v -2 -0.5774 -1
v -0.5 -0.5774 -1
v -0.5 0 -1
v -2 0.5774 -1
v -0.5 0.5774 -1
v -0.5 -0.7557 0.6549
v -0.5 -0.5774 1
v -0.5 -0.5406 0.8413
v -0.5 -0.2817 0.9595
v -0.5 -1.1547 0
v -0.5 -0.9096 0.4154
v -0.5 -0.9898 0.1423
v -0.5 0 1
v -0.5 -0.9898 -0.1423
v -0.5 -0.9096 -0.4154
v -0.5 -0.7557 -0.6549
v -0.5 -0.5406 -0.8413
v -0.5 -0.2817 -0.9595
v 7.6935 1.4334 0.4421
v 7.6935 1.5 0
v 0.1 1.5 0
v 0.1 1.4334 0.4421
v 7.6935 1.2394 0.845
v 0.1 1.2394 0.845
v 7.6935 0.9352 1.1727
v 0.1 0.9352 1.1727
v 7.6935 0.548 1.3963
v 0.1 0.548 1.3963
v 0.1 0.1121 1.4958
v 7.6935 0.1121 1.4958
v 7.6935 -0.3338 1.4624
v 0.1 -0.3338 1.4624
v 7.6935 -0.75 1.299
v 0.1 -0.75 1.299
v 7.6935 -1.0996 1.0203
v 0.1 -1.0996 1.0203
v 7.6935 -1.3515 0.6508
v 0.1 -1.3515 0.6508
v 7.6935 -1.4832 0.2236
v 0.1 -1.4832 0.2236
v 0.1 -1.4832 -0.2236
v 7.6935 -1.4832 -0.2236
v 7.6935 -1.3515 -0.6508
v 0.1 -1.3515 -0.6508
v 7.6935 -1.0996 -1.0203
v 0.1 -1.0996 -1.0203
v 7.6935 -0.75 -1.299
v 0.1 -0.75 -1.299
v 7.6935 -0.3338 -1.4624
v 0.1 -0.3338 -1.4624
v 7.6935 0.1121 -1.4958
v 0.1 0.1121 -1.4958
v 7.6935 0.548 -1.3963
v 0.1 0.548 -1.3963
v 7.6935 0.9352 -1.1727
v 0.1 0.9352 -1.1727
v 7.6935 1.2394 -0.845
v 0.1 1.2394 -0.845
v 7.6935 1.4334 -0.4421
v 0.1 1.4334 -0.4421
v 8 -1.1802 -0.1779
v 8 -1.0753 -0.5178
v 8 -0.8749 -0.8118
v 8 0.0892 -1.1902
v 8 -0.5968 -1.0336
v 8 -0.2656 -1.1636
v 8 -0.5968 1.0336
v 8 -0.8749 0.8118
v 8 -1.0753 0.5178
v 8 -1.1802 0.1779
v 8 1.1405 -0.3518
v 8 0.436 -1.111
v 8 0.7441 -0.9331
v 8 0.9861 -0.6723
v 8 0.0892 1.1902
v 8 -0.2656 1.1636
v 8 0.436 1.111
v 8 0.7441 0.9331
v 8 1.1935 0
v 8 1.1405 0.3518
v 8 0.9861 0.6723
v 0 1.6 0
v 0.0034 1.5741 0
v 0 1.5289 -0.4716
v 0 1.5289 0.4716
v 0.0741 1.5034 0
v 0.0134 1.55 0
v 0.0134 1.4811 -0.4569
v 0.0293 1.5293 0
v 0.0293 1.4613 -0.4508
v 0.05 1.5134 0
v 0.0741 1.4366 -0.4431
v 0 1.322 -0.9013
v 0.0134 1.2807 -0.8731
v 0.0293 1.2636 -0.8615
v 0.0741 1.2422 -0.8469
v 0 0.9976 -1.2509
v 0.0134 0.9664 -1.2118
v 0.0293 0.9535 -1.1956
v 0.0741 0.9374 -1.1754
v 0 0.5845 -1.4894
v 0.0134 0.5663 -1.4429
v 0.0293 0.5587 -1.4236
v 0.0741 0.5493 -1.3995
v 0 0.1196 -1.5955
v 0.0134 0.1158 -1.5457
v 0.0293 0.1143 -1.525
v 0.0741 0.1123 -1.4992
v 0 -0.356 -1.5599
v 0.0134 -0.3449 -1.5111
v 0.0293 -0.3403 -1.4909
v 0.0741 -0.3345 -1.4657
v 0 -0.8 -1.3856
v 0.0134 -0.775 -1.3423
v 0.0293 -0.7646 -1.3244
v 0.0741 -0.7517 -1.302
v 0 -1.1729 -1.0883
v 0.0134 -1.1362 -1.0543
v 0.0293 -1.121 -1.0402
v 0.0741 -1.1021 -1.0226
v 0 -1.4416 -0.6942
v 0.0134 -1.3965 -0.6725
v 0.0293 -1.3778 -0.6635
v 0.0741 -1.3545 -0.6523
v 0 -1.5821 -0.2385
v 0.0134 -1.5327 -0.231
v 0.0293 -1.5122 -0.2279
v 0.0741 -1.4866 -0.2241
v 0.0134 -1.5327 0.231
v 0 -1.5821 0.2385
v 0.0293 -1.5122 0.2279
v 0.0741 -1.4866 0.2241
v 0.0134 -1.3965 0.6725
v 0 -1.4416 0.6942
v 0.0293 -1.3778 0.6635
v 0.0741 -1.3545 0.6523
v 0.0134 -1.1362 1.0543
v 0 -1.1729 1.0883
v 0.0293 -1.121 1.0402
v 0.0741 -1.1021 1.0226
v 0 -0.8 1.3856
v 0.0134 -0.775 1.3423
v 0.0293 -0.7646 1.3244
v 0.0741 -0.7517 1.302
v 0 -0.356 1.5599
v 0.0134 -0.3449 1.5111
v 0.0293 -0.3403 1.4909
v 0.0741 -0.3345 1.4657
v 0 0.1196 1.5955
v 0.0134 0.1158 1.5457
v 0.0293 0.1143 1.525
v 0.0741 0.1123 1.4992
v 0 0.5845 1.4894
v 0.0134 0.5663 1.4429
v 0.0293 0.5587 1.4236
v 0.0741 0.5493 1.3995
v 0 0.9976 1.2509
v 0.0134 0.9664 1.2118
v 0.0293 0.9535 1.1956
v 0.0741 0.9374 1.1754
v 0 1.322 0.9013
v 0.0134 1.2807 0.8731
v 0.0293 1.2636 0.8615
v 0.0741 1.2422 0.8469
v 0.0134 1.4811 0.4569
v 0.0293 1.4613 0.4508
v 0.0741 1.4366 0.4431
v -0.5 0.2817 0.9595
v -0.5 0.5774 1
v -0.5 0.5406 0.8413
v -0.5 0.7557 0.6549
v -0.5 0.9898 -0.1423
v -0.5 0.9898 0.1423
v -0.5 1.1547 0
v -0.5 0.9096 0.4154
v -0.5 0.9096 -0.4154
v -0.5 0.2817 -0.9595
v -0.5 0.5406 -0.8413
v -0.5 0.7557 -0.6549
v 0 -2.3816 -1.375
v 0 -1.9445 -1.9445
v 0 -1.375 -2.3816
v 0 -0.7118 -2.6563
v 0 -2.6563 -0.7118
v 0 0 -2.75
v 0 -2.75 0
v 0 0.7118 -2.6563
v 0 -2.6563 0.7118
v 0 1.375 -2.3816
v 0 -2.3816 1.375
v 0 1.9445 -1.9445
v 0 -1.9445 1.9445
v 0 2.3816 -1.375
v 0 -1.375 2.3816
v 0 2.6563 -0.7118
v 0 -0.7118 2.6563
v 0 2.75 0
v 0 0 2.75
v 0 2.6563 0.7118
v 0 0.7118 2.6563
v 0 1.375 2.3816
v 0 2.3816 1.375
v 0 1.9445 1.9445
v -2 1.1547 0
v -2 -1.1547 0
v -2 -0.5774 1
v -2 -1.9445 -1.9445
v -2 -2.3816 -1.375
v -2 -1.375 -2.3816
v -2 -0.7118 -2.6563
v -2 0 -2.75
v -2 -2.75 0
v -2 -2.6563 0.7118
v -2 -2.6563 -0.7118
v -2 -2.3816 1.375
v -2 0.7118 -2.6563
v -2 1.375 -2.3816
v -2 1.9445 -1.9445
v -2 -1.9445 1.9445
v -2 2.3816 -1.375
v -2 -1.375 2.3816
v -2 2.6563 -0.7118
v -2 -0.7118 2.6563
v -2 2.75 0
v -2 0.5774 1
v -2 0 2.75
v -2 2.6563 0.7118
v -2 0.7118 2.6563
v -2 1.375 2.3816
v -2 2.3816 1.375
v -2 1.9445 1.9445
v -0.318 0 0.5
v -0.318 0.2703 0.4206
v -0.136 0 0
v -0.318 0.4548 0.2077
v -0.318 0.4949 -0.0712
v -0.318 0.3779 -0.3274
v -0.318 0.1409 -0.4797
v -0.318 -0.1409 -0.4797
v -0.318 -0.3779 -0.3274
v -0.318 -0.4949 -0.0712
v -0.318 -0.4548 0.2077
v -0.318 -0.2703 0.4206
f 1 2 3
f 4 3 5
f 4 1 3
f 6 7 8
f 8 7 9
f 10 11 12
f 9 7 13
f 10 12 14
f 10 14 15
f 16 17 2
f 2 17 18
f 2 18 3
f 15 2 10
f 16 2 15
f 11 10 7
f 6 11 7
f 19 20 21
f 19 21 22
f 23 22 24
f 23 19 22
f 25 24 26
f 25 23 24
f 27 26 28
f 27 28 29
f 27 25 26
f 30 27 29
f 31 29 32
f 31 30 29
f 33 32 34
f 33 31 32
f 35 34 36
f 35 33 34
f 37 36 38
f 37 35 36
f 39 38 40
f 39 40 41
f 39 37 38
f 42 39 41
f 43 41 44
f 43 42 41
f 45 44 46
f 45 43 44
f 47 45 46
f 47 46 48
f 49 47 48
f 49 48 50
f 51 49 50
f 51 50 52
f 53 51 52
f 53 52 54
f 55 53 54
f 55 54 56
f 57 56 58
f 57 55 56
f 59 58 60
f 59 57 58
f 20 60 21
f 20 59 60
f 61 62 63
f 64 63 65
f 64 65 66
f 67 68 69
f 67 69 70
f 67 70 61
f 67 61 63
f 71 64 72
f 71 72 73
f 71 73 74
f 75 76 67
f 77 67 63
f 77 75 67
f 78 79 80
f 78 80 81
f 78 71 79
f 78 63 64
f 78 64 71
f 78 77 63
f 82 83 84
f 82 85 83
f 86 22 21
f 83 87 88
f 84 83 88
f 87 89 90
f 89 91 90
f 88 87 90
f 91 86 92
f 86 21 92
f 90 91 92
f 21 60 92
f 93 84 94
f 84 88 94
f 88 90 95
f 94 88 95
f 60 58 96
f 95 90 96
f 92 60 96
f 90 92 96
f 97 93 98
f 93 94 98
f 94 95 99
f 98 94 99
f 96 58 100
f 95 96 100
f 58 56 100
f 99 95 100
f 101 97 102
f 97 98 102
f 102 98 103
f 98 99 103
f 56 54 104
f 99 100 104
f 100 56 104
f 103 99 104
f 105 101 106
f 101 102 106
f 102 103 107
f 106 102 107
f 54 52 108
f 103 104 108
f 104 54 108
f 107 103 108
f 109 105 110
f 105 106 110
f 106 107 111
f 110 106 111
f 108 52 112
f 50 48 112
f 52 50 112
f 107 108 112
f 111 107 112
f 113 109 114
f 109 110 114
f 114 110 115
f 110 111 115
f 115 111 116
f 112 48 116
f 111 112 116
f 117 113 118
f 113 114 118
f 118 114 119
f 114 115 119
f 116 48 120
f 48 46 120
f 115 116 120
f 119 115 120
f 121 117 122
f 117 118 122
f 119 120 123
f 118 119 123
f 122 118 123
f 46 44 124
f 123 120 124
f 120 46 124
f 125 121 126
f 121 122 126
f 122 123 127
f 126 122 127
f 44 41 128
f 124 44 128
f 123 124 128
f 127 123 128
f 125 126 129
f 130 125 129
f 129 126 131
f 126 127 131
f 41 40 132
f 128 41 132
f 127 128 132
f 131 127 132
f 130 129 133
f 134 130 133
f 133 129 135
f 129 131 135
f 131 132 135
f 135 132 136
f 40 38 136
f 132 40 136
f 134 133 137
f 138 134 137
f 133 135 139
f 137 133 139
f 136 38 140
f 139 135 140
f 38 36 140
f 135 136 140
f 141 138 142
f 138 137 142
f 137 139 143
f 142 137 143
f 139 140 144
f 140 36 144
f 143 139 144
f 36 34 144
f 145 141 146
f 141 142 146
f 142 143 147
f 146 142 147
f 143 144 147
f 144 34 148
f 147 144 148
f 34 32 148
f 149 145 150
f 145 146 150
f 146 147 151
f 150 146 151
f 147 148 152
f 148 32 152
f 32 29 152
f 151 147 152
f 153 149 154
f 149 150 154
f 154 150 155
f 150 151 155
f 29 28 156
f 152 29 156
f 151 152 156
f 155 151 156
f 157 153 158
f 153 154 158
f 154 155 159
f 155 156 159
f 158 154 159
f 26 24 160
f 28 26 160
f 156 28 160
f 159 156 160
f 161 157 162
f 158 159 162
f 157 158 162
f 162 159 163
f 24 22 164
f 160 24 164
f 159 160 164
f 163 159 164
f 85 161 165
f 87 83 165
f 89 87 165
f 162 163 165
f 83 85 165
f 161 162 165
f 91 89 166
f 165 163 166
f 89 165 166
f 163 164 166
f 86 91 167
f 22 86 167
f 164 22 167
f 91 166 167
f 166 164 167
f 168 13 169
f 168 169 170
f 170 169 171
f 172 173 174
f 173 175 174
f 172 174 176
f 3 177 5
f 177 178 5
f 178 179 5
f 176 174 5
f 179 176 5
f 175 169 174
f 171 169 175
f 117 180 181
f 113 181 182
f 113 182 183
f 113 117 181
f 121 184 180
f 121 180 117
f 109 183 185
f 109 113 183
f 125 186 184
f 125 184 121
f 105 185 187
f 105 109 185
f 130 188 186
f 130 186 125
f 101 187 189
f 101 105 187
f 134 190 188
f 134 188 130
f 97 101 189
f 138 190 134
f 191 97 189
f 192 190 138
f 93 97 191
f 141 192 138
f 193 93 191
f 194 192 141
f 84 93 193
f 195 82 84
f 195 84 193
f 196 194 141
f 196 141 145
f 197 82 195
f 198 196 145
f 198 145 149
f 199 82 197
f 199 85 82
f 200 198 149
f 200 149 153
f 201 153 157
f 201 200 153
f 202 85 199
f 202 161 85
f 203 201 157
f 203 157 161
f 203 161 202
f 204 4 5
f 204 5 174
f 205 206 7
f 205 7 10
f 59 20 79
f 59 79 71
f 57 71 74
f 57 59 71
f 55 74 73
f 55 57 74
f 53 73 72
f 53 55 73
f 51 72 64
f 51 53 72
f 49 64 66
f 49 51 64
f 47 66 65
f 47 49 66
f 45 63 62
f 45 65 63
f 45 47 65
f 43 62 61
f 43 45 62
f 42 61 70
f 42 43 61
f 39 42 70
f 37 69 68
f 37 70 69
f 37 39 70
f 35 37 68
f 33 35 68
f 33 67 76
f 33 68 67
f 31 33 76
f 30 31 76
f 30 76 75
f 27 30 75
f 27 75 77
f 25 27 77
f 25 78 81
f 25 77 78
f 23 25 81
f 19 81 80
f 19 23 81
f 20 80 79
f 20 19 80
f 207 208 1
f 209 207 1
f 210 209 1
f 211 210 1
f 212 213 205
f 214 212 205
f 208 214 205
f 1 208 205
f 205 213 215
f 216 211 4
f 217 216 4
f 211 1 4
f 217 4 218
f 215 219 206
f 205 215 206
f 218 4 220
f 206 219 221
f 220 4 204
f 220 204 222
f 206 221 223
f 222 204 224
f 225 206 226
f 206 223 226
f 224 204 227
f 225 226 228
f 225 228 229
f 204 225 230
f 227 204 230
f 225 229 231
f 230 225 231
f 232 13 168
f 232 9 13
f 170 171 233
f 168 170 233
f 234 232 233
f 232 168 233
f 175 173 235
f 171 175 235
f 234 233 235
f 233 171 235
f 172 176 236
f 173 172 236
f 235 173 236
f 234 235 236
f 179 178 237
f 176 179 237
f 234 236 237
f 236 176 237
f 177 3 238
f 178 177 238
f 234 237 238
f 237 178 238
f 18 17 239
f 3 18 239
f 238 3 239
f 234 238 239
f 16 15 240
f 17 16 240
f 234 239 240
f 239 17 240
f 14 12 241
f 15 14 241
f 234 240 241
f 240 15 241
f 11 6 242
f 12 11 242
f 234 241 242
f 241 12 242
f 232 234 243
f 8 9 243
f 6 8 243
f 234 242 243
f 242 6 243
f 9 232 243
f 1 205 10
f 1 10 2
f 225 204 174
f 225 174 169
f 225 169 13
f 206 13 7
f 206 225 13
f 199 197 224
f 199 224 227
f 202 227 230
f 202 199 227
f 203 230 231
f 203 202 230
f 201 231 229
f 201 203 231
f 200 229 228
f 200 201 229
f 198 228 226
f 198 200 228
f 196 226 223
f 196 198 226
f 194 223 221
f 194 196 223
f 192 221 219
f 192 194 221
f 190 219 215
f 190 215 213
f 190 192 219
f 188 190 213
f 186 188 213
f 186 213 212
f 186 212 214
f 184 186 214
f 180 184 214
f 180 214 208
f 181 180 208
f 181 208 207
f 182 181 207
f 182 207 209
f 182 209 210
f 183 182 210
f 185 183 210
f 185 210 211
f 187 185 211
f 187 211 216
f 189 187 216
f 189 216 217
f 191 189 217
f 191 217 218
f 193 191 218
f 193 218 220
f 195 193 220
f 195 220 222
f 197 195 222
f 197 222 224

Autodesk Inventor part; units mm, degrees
sketch "Sketch_1" plane through (0, 0, 0) normal (0, 0, 1) x (1, 0, 0)
  line L0 (8, 0) -> (-2, 0)
  line L1 (-2, 0) -> (-2, 2.75)
  line L2 (-2, 2.75) -> (0, 2.75)
  line L3 (0, 2.75) -> (0, 1.6)
  arc A0 (0, 1.6) -> (0.1, 1.5) centre (0.1, 1.6) ccw
  line L4 (0.1, 1.5) -> (7.6935, 1.5)
  line L5 (7.6935, 1.5) -> (8, 1.1935)
  line L6 (8, 1.1935) -> (8, 0)
  line L7 (8, 0) -> (-2, 0)
revolve "Revolution1" add sketch "Sketch_1" angle 360 about axis through (8, 0, 0) along (1, 0, 0)
thread "Thread1" size "M3x0.5" class "6g" standard "ISO Metric profile" length 7.1935
sketch "Sketch2" plane through (-2, 0, 0) normal (-1, 0, 0) x (0, 0, 1)
  point P0 (0, 0)
hole "Hole1" at (-2, 0, 0) direction (1, 0, 0) diameter 2 depth 1.5 tip angle 140
sketch "Sketch_3" plane through (-2, 0, 0) normal (1, 0, 0) x (0, 0, -1)
  line L0 (-1, 0.5774) -> (-1, -0.5774)
  line L1 (-1, -0.5774) -> (0, -1.1547)
  line L2 (0, -1.1547) -> (1, -0.5774)
  line L3 (1, -0.5774) -> (1, 0.5774)
  line L4 (1, 0.5774) -> (0, 1.1547)
  line L5 (0, 1.1547) -> (-1, 0.5774)
extrude "Extrusion1" cut sketch "Sketch_3" along normal blind 1.5
ref_plane "bolt_XY" through (0, 0, 0) normal (1, 0, 0) x (0, 0, -1)
ref_plane "bolt_YZ" through (0, 0, 0) normal (0, 0, -1) x (0, 1, 0)
ref_plane "bolt_ZX" through (0, 0, 0) normal (0, 1, 0) x (1, 0, 0)
ref_plane "bolt_to_nut_XY" through (8, 0, 0) normal (1, 0, 0) x (0, 0, -1)
ref_plane "bolt_to_nut_YZ" through (8, 0, 0) normal (0, 0, -1) x (0, 1, 0)
ref_plane "bolt_to_nut_ZX" through (8, 0, 0) normal (0, 1, 0) x (1, 0, 0)
properties part number "CBS3-8"
